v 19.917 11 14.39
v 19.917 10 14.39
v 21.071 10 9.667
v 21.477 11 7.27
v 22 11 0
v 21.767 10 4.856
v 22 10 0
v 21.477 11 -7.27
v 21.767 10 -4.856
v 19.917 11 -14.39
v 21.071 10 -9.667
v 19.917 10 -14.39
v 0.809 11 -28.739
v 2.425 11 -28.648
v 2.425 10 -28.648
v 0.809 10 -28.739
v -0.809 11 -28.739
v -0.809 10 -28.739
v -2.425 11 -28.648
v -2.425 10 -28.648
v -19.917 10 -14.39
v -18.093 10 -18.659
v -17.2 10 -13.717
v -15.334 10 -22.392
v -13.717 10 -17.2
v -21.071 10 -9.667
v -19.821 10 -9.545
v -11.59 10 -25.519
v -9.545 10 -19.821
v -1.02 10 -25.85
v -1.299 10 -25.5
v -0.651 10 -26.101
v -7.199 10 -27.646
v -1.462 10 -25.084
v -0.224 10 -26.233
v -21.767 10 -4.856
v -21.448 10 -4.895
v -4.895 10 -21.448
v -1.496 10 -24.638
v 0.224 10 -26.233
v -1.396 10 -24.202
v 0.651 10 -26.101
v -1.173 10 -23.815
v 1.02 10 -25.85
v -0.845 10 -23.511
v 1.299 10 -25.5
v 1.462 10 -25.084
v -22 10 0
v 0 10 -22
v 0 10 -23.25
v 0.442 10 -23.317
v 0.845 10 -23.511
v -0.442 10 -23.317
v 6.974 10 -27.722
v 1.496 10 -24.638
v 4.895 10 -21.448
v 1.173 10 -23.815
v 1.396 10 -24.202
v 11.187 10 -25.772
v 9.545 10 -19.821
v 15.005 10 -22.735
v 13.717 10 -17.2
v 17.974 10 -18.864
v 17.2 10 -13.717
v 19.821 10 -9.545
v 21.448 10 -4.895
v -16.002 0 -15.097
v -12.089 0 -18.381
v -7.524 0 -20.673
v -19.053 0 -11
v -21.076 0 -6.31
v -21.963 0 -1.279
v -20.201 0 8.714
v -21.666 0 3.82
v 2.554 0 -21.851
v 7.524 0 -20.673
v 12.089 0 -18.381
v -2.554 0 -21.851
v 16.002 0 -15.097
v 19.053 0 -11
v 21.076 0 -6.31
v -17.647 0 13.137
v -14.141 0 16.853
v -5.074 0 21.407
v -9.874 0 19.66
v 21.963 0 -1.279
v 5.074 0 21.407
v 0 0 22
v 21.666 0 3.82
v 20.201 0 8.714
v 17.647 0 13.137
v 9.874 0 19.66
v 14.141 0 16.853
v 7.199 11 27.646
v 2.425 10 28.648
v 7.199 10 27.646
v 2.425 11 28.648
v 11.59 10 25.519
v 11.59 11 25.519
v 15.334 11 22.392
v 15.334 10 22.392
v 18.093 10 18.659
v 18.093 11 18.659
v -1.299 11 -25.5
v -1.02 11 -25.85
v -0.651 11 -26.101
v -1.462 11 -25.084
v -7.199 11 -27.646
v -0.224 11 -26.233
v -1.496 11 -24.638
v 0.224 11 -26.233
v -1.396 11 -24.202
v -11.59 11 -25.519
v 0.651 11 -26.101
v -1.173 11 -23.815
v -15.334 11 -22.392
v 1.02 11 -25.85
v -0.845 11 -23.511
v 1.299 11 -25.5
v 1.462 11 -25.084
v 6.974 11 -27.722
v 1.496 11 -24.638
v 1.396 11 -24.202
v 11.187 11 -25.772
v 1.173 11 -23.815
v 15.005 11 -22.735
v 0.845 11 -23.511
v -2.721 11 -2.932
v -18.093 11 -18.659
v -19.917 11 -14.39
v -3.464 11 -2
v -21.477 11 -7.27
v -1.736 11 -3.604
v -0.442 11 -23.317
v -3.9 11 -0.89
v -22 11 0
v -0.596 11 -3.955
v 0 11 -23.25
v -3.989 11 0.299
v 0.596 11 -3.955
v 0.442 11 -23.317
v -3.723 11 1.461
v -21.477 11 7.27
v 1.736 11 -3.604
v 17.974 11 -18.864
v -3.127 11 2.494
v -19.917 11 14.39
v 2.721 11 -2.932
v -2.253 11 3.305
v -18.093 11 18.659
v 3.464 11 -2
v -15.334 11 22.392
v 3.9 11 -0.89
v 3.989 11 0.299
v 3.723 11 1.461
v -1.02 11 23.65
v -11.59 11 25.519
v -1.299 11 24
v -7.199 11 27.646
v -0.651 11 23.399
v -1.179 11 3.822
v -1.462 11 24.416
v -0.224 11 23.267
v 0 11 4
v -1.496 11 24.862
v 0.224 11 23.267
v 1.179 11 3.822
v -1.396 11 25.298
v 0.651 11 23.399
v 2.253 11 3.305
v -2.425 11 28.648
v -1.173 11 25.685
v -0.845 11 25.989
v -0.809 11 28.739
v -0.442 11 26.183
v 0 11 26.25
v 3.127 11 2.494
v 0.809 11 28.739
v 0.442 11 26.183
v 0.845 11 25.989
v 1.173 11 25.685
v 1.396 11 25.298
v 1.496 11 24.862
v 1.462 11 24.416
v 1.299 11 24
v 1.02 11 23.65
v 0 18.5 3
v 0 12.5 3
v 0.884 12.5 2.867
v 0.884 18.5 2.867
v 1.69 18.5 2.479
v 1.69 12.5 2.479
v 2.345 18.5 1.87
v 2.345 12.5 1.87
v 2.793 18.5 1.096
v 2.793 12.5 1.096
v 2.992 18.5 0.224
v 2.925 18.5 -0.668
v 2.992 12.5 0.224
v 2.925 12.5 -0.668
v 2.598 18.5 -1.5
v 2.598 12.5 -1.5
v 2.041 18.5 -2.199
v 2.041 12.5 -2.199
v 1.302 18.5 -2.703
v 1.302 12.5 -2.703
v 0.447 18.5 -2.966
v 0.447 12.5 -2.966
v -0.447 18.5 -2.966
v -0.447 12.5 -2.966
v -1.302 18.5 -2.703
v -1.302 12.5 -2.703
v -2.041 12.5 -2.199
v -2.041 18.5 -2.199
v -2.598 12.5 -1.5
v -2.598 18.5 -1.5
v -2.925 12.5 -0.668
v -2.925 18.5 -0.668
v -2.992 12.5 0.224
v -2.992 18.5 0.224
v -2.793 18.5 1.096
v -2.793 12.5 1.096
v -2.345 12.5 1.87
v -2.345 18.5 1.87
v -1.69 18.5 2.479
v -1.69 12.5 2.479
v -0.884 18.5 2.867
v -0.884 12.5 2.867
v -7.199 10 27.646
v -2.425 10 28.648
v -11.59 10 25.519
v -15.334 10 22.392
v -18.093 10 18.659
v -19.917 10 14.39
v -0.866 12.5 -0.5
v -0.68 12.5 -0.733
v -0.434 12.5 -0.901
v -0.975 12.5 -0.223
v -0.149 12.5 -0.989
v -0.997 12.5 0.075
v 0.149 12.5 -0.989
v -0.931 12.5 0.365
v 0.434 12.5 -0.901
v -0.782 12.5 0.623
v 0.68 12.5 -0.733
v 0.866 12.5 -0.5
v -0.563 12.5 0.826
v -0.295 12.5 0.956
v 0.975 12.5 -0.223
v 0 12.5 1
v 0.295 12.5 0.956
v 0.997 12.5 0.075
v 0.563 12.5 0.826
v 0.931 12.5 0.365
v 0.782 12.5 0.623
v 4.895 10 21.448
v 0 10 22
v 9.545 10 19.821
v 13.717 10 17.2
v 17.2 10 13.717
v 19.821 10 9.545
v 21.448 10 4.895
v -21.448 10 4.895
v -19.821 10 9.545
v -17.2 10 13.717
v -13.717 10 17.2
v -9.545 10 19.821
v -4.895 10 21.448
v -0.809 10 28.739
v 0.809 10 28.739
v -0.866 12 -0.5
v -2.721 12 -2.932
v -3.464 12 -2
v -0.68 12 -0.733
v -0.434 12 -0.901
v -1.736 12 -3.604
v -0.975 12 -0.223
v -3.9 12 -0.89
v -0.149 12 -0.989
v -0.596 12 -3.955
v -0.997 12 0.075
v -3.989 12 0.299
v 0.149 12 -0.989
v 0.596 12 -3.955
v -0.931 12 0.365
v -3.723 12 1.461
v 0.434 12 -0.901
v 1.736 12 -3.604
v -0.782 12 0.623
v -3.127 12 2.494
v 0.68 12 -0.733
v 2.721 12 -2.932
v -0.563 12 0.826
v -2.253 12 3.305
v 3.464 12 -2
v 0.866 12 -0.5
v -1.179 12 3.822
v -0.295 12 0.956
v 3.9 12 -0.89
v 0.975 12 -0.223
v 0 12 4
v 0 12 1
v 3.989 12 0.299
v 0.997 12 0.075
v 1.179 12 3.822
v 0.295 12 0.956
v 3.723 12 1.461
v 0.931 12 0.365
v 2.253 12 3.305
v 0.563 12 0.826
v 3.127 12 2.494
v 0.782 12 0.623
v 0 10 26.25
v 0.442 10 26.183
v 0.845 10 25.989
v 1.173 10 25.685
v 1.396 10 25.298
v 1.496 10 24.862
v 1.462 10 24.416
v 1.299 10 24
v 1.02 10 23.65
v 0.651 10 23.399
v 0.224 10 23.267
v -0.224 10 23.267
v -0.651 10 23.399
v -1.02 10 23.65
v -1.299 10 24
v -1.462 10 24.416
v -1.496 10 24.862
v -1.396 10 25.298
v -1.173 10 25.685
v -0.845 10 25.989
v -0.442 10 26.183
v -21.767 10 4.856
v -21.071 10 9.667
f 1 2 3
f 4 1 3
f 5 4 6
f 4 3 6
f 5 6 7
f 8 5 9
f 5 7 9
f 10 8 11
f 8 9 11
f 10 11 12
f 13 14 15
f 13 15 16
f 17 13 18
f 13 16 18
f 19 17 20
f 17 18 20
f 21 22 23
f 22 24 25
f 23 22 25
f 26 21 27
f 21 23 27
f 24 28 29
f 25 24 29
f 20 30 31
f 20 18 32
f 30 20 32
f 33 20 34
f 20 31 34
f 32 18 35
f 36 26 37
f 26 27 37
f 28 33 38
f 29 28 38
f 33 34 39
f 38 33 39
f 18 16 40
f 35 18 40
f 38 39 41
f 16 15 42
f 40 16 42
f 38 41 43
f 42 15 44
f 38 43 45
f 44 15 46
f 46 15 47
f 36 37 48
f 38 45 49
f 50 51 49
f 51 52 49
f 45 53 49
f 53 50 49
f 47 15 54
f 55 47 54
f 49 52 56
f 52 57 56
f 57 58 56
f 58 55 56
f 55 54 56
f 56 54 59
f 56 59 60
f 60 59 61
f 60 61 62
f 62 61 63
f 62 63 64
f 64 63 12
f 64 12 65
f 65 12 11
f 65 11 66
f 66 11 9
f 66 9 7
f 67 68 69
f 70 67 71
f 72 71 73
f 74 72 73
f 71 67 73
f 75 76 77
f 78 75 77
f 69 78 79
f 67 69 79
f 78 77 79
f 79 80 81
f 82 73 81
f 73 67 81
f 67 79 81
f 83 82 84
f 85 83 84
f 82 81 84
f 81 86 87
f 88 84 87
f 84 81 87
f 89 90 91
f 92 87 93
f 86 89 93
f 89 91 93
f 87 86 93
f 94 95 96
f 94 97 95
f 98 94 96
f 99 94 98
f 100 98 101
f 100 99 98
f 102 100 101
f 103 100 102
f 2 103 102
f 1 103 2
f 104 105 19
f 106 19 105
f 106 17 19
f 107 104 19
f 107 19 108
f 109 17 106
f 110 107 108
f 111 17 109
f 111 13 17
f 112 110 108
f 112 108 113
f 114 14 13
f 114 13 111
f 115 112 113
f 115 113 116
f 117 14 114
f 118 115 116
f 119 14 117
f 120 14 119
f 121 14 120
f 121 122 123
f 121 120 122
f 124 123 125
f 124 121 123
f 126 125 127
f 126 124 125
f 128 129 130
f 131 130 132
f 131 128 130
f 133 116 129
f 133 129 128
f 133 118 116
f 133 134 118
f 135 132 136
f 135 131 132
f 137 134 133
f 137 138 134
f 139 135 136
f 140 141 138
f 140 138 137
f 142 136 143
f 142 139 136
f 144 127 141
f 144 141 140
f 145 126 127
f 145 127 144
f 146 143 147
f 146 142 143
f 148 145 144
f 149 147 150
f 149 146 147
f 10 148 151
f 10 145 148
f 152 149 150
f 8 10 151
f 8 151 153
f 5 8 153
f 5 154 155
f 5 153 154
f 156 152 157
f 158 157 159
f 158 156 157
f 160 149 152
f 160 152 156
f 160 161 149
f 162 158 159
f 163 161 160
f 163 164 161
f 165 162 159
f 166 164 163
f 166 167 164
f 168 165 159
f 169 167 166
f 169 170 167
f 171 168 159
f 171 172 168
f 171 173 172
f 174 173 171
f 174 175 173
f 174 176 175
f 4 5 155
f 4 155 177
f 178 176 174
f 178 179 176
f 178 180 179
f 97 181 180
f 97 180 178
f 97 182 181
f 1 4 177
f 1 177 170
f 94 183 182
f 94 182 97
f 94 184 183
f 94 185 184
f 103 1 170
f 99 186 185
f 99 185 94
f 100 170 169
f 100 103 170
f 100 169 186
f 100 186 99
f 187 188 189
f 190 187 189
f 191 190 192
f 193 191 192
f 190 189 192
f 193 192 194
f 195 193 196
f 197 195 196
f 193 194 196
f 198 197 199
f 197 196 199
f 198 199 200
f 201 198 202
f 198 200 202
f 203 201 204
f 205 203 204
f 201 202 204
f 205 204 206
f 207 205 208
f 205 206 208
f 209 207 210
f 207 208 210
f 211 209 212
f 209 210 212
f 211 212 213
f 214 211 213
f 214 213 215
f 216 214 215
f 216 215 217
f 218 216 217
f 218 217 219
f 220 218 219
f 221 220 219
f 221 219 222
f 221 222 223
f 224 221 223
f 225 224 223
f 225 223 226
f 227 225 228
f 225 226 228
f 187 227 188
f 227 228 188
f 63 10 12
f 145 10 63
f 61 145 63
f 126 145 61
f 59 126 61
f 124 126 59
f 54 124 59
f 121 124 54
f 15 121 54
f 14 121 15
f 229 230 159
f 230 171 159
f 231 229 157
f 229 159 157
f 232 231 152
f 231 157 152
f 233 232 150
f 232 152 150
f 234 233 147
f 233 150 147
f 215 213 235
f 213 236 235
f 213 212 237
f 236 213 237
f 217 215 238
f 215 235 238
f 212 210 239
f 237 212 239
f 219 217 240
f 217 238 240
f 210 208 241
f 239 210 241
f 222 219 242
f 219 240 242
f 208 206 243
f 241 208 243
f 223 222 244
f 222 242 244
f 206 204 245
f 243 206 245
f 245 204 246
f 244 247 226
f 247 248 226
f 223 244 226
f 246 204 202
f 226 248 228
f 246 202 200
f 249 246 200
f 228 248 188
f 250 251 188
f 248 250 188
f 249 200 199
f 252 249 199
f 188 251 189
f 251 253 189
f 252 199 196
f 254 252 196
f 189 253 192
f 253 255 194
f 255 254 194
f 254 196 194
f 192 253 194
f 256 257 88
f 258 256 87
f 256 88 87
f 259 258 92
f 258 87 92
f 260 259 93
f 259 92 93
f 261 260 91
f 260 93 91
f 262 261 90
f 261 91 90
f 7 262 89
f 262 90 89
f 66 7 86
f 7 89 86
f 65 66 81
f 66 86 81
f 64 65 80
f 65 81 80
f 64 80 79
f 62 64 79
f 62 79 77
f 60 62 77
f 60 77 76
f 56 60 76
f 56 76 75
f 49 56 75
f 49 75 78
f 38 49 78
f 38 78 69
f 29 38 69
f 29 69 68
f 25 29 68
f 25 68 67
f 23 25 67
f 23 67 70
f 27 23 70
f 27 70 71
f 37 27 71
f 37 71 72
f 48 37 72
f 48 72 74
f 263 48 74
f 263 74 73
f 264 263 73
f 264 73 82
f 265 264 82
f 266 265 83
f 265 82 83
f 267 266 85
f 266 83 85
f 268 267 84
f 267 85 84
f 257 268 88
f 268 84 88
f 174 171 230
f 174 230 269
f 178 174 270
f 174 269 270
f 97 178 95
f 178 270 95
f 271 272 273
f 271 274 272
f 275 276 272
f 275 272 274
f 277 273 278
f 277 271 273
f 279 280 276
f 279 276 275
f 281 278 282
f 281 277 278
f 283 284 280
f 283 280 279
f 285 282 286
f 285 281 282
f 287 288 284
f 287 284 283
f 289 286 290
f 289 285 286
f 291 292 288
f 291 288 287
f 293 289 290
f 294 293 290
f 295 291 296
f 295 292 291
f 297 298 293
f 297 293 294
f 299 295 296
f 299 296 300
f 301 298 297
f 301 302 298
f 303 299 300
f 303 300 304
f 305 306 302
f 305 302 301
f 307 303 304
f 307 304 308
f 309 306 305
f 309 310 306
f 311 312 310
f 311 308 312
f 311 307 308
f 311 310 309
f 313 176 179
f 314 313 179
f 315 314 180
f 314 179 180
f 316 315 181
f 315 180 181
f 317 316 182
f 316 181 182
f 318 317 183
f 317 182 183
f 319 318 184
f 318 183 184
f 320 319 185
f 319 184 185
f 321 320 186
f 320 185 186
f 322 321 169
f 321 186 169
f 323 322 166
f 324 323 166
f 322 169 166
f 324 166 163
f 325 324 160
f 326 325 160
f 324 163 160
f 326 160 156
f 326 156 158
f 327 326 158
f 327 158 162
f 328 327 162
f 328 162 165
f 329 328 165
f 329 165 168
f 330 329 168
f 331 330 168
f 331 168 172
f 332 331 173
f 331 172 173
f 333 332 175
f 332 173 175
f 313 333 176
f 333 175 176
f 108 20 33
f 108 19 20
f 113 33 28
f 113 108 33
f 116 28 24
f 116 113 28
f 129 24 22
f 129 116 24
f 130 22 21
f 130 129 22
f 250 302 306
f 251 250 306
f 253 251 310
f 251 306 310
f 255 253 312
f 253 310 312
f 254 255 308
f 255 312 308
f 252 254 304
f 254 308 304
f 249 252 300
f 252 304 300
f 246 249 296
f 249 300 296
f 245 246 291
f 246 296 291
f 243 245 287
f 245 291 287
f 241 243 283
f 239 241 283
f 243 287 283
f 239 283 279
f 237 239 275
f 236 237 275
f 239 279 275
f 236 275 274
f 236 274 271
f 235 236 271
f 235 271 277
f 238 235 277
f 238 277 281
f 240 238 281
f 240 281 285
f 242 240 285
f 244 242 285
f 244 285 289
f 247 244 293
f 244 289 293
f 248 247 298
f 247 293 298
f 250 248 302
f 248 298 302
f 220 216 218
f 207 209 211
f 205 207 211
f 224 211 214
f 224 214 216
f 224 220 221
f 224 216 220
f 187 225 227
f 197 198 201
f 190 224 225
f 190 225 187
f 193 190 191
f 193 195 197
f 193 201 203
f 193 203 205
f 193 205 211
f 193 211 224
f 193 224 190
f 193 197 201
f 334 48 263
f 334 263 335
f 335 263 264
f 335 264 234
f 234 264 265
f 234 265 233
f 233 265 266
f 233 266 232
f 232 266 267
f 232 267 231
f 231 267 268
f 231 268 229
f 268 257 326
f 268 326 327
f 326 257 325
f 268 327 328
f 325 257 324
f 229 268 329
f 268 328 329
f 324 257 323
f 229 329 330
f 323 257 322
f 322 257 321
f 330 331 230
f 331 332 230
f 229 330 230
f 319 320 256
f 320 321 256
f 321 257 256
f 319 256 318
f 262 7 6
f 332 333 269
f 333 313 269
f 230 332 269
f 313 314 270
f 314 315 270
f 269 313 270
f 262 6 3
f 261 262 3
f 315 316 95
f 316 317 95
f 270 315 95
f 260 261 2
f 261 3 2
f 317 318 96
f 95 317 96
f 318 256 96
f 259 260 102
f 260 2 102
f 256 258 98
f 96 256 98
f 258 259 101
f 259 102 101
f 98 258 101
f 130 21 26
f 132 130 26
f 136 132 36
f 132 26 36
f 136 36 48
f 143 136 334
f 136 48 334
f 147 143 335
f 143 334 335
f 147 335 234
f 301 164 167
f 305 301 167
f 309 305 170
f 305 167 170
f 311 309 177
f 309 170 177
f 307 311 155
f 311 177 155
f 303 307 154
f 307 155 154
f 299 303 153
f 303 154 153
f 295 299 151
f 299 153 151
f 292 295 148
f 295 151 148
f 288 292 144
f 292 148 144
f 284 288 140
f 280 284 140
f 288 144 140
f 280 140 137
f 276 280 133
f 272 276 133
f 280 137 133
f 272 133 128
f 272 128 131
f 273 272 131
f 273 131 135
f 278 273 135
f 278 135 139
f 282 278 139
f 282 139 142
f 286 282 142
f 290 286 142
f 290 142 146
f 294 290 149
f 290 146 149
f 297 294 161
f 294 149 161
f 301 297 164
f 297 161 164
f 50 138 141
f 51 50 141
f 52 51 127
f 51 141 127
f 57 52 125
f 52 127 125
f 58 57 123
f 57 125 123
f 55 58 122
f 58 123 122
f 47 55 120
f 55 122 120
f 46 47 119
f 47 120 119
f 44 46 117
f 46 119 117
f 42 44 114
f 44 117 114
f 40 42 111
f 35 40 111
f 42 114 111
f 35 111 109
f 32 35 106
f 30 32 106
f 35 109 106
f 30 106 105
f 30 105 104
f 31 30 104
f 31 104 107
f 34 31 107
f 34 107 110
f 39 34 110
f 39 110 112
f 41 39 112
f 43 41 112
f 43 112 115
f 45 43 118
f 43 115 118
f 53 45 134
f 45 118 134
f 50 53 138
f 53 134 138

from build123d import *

# Parameters (mm, degrees)
SKETCH1_R           = 22
BOSS_EXTRUDE1_DEPTH = 10
SKETCH2_R           = 28.75
BOSS_EXTRUDE2_DEPTH = 1
SKETCH3_R           = 1.5
CUT_EXTRUDE1_DEPTH  = 1
CUT_EXTRUDE2_DEPTH  = 1
FILLET1_R           = 20
SKETCH5_R           = 4
BOSS_EXTRUDE3_DEPTH = 1
SKETCH6_R           = 1
BOSS_EXTRUDE4_DEPTH = 0.5
SKETCH7_R           = 3
BOSS_EXTRUDE5_DEPTH = 6


with BuildPart() as part:
    # Sketch1 → Boss-Extrude1 (new body)
    with BuildSketch(Plane(origin=(0, 0, 0), x_dir=(1, 0, 0), z_dir=(0, 1, 0))):
        with Locations(Location((0, 0, 0), (0, 0, 270))):
            Circle(SKETCH1_R)
    extrude(amount=BOSS_EXTRUDE1_DEPTH)

    # Sketch2 → Boss-Extrude2 (add)
    with BuildSketch(Plane(origin=(0, 10, 0), x_dir=(1, 0, 0), z_dir=(0, 1, 0))):
        with Locations(Location((0, 0, 0), (0, 0, 270))):
            Circle(SKETCH2_R)
    extrude(amount=BOSS_EXTRUDE2_DEPTH)

    # Sketch3 → Cut-Extrude1 (cut)
    with BuildSketch(Plane(origin=(0, 11, 0), x_dir=(1, 0, 0), z_dir=(0, 1, 0))):
        with Locations(Location((0, -24.75, 0), (0, 0, 270))):
            Circle(SKETCH3_R)
        with Locations(Location((0, 24.75, 0), (0, 0, 270))):
            Circle(SKETCH3_R)
    extrude(amount=-CUT_EXTRUDE1_DEPTH, mode=Mode.SUBTRACT)

    # Sketch4 → Cut-Extrude2 (cut)
    with BuildSketch(Plane.XZ.offset(-10)):
        with BuildLine():
            ThreePointArc((-16.042391304, -23.858000361), (-22, 0), (-16.042391304, 23.858000361))
            ThreePointArc((-16.042391304, 23.858000361), (-28.75, 0), (-16.042391304, -23.858000361))
        make_face()
        with BuildLine():
            ThreePointArc((16.042391304, -23.858000361), (28.75, 0), (16.042391304, 23.858000361))
            ThreePointArc((16.042391304, 23.858000361), (22, 0), (16.042391304, -23.858000361))
        make_face()
    extrude(amount=-CUT_EXTRUDE2_DEPTH, mode=Mode.SUBTRACT)

    # Fillet1
    fillet1_edges = [part.edges().sort_by_distance(p)[0] for p in [
        (-16.042391304, 10.5, 23.858000361),
        (-16.042391304, 10.5, -23.858000361),
        (16.042391304, 10.5, -23.858000361),
        (16.042391304, 10.5, 23.858000361),
    ]]
    fillet(fillet1_edges, radius=FILLET1_R)

    # Sketch5 → Boss-Extrude3 (add)
    with BuildSketch(Plane(origin=(0, 11, 0), x_dir=(1, 0, 0), z_dir=(0, 1, 0))):
        with Locations(Location((0, 0, 0), (0, 0, 270))):
            Circle(SKETCH5_R)
    extrude(amount=BOSS_EXTRUDE3_DEPTH)

    # Sketch6 → Boss-Extrude4 (add)
    with BuildSketch(Plane(origin=(0, 12, 0), x_dir=(1, 0, 0), z_dir=(0, 1, 0))):
        with Locations(Location((0, 0, 0), (0, 0, 270))):
            Circle(SKETCH6_R)
    extrude(amount=BOSS_EXTRUDE4_DEPTH)

    # Sketch7 → Boss-Extrude5 (add)
    with BuildSketch(Plane(origin=(0, 12.5, 0), x_dir=(1, 0, 0), z_dir=(0, 1, 0))):
        with Locations(Location((0, 0, 0), (0, 0, 270))):
            Circle(SKETCH7_R)
    extrude(amount=BOSS_EXTRUDE5_DEPTH)


solid = part.part
